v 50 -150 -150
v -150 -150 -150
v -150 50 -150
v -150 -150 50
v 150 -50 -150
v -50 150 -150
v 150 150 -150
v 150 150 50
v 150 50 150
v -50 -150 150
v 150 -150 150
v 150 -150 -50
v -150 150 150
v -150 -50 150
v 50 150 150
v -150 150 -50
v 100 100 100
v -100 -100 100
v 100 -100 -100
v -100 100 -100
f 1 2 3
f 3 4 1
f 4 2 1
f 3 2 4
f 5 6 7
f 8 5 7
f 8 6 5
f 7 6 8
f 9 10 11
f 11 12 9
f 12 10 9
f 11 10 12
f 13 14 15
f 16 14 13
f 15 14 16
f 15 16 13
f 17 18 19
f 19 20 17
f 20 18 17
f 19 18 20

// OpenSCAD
coords = [
	0, // 10
	[ -1, -1, -1 ], // 11
	[  0, -1, -1 ], // 12
	[ +1, -1, -1 ], // 13
	[ -1,  0, -1 ], // 14
	[  0,  0, -1 ], // 15
	[ +1,  0, -1 ], // 16
	[ -1, +1, -1 ], // 17
	[  0, +1, -1 ], // 18
	[ +1, +1, -1 ], // 19
	0, // 20
	[ -1, -1,  0 ], // 21
	[  0, -1,  0 ], // 22
	[ +1, -1,  0 ], // 23
	[ -1,  0,  0 ], // 24
	[  0,  0,  0 ], // 25
	[ +1,  0,  0 ], // 26
	[ -1, +1,  0 ], // 27
	[  0, +1,  0 ], // 28
	[ +1, +1,  0 ], // 29
	0, // 30
	[ -1, -1, +1 ], // 31
	[  0, -1, +1 ], // 32
	[ +1, -1, +1 ], // 33
	[ -1,  0, +1 ], // 34
	[  0,  0, +1 ], // 35
	[ +1,  0, +1 ], // 36
	[ -1, +1, +1 ], // 37
	[  0, +1, +1 ], // 38
	[ +1, +1, +1 ], // 39
];

module tet(A, B, C, D)
{
	X = (coords[A - 10] + coords[B - 10] + coords[C - 10] + coords[D - 10]) * 0.25;
	translate(X * $explode) {
		polyhedron(
			points=[
				coords[A - 10] * 100,
				coords[B - 10] * 100,
				coords[C - 10] * 100,
				coords[D - 10] * 100
			], triangles=[
				[ 0, 1, 2 ],
				[ 0, 3, 1 ],
				[ 0, 2, 3 ],
				[ 1, 3, 2 ]
			]);
	}
}

module tetsplit(A, B, C, D, pAB, pAC, pAD, pBC, pBD, pCD)
{
	if (!pAB && !pAC && !pAD && !pBC && !pBD && !pCD)
		tet(A, B, C, D);
}

module cube(
		p12, p16, p18, p14, p15,
		p21, p22, p23, p26, p29, p28, p27, p24,
		p32, p36, p38, p34, p35
	)
{
	$explode = 50 + 50*cos($t*360);

	//        A   B   C   D   AB,  AC,  AD,  BC,  BD,  CD
	tetsplit(11, 13, 17, 31, p12, p14, p21, p15, p22, p24);
	tetsplit(17, 13, 19, 39, p15, p18, p28, p16, p26, p29);
	tetsplit(31, 39, 33, 13, p35, p32, p22, p36, p26, p23);
	tetsplit(39, 31, 37, 17, p35, p38, p28, p34, p24, p27);
	tetsplit(31, 39, 13, 17, p35, p22, p24, p26, p28, p15);
}

cube(
	false, false, false, false, false,
	false, false, false, false, false, false, false, false,
	false, false, false, false, false
);
